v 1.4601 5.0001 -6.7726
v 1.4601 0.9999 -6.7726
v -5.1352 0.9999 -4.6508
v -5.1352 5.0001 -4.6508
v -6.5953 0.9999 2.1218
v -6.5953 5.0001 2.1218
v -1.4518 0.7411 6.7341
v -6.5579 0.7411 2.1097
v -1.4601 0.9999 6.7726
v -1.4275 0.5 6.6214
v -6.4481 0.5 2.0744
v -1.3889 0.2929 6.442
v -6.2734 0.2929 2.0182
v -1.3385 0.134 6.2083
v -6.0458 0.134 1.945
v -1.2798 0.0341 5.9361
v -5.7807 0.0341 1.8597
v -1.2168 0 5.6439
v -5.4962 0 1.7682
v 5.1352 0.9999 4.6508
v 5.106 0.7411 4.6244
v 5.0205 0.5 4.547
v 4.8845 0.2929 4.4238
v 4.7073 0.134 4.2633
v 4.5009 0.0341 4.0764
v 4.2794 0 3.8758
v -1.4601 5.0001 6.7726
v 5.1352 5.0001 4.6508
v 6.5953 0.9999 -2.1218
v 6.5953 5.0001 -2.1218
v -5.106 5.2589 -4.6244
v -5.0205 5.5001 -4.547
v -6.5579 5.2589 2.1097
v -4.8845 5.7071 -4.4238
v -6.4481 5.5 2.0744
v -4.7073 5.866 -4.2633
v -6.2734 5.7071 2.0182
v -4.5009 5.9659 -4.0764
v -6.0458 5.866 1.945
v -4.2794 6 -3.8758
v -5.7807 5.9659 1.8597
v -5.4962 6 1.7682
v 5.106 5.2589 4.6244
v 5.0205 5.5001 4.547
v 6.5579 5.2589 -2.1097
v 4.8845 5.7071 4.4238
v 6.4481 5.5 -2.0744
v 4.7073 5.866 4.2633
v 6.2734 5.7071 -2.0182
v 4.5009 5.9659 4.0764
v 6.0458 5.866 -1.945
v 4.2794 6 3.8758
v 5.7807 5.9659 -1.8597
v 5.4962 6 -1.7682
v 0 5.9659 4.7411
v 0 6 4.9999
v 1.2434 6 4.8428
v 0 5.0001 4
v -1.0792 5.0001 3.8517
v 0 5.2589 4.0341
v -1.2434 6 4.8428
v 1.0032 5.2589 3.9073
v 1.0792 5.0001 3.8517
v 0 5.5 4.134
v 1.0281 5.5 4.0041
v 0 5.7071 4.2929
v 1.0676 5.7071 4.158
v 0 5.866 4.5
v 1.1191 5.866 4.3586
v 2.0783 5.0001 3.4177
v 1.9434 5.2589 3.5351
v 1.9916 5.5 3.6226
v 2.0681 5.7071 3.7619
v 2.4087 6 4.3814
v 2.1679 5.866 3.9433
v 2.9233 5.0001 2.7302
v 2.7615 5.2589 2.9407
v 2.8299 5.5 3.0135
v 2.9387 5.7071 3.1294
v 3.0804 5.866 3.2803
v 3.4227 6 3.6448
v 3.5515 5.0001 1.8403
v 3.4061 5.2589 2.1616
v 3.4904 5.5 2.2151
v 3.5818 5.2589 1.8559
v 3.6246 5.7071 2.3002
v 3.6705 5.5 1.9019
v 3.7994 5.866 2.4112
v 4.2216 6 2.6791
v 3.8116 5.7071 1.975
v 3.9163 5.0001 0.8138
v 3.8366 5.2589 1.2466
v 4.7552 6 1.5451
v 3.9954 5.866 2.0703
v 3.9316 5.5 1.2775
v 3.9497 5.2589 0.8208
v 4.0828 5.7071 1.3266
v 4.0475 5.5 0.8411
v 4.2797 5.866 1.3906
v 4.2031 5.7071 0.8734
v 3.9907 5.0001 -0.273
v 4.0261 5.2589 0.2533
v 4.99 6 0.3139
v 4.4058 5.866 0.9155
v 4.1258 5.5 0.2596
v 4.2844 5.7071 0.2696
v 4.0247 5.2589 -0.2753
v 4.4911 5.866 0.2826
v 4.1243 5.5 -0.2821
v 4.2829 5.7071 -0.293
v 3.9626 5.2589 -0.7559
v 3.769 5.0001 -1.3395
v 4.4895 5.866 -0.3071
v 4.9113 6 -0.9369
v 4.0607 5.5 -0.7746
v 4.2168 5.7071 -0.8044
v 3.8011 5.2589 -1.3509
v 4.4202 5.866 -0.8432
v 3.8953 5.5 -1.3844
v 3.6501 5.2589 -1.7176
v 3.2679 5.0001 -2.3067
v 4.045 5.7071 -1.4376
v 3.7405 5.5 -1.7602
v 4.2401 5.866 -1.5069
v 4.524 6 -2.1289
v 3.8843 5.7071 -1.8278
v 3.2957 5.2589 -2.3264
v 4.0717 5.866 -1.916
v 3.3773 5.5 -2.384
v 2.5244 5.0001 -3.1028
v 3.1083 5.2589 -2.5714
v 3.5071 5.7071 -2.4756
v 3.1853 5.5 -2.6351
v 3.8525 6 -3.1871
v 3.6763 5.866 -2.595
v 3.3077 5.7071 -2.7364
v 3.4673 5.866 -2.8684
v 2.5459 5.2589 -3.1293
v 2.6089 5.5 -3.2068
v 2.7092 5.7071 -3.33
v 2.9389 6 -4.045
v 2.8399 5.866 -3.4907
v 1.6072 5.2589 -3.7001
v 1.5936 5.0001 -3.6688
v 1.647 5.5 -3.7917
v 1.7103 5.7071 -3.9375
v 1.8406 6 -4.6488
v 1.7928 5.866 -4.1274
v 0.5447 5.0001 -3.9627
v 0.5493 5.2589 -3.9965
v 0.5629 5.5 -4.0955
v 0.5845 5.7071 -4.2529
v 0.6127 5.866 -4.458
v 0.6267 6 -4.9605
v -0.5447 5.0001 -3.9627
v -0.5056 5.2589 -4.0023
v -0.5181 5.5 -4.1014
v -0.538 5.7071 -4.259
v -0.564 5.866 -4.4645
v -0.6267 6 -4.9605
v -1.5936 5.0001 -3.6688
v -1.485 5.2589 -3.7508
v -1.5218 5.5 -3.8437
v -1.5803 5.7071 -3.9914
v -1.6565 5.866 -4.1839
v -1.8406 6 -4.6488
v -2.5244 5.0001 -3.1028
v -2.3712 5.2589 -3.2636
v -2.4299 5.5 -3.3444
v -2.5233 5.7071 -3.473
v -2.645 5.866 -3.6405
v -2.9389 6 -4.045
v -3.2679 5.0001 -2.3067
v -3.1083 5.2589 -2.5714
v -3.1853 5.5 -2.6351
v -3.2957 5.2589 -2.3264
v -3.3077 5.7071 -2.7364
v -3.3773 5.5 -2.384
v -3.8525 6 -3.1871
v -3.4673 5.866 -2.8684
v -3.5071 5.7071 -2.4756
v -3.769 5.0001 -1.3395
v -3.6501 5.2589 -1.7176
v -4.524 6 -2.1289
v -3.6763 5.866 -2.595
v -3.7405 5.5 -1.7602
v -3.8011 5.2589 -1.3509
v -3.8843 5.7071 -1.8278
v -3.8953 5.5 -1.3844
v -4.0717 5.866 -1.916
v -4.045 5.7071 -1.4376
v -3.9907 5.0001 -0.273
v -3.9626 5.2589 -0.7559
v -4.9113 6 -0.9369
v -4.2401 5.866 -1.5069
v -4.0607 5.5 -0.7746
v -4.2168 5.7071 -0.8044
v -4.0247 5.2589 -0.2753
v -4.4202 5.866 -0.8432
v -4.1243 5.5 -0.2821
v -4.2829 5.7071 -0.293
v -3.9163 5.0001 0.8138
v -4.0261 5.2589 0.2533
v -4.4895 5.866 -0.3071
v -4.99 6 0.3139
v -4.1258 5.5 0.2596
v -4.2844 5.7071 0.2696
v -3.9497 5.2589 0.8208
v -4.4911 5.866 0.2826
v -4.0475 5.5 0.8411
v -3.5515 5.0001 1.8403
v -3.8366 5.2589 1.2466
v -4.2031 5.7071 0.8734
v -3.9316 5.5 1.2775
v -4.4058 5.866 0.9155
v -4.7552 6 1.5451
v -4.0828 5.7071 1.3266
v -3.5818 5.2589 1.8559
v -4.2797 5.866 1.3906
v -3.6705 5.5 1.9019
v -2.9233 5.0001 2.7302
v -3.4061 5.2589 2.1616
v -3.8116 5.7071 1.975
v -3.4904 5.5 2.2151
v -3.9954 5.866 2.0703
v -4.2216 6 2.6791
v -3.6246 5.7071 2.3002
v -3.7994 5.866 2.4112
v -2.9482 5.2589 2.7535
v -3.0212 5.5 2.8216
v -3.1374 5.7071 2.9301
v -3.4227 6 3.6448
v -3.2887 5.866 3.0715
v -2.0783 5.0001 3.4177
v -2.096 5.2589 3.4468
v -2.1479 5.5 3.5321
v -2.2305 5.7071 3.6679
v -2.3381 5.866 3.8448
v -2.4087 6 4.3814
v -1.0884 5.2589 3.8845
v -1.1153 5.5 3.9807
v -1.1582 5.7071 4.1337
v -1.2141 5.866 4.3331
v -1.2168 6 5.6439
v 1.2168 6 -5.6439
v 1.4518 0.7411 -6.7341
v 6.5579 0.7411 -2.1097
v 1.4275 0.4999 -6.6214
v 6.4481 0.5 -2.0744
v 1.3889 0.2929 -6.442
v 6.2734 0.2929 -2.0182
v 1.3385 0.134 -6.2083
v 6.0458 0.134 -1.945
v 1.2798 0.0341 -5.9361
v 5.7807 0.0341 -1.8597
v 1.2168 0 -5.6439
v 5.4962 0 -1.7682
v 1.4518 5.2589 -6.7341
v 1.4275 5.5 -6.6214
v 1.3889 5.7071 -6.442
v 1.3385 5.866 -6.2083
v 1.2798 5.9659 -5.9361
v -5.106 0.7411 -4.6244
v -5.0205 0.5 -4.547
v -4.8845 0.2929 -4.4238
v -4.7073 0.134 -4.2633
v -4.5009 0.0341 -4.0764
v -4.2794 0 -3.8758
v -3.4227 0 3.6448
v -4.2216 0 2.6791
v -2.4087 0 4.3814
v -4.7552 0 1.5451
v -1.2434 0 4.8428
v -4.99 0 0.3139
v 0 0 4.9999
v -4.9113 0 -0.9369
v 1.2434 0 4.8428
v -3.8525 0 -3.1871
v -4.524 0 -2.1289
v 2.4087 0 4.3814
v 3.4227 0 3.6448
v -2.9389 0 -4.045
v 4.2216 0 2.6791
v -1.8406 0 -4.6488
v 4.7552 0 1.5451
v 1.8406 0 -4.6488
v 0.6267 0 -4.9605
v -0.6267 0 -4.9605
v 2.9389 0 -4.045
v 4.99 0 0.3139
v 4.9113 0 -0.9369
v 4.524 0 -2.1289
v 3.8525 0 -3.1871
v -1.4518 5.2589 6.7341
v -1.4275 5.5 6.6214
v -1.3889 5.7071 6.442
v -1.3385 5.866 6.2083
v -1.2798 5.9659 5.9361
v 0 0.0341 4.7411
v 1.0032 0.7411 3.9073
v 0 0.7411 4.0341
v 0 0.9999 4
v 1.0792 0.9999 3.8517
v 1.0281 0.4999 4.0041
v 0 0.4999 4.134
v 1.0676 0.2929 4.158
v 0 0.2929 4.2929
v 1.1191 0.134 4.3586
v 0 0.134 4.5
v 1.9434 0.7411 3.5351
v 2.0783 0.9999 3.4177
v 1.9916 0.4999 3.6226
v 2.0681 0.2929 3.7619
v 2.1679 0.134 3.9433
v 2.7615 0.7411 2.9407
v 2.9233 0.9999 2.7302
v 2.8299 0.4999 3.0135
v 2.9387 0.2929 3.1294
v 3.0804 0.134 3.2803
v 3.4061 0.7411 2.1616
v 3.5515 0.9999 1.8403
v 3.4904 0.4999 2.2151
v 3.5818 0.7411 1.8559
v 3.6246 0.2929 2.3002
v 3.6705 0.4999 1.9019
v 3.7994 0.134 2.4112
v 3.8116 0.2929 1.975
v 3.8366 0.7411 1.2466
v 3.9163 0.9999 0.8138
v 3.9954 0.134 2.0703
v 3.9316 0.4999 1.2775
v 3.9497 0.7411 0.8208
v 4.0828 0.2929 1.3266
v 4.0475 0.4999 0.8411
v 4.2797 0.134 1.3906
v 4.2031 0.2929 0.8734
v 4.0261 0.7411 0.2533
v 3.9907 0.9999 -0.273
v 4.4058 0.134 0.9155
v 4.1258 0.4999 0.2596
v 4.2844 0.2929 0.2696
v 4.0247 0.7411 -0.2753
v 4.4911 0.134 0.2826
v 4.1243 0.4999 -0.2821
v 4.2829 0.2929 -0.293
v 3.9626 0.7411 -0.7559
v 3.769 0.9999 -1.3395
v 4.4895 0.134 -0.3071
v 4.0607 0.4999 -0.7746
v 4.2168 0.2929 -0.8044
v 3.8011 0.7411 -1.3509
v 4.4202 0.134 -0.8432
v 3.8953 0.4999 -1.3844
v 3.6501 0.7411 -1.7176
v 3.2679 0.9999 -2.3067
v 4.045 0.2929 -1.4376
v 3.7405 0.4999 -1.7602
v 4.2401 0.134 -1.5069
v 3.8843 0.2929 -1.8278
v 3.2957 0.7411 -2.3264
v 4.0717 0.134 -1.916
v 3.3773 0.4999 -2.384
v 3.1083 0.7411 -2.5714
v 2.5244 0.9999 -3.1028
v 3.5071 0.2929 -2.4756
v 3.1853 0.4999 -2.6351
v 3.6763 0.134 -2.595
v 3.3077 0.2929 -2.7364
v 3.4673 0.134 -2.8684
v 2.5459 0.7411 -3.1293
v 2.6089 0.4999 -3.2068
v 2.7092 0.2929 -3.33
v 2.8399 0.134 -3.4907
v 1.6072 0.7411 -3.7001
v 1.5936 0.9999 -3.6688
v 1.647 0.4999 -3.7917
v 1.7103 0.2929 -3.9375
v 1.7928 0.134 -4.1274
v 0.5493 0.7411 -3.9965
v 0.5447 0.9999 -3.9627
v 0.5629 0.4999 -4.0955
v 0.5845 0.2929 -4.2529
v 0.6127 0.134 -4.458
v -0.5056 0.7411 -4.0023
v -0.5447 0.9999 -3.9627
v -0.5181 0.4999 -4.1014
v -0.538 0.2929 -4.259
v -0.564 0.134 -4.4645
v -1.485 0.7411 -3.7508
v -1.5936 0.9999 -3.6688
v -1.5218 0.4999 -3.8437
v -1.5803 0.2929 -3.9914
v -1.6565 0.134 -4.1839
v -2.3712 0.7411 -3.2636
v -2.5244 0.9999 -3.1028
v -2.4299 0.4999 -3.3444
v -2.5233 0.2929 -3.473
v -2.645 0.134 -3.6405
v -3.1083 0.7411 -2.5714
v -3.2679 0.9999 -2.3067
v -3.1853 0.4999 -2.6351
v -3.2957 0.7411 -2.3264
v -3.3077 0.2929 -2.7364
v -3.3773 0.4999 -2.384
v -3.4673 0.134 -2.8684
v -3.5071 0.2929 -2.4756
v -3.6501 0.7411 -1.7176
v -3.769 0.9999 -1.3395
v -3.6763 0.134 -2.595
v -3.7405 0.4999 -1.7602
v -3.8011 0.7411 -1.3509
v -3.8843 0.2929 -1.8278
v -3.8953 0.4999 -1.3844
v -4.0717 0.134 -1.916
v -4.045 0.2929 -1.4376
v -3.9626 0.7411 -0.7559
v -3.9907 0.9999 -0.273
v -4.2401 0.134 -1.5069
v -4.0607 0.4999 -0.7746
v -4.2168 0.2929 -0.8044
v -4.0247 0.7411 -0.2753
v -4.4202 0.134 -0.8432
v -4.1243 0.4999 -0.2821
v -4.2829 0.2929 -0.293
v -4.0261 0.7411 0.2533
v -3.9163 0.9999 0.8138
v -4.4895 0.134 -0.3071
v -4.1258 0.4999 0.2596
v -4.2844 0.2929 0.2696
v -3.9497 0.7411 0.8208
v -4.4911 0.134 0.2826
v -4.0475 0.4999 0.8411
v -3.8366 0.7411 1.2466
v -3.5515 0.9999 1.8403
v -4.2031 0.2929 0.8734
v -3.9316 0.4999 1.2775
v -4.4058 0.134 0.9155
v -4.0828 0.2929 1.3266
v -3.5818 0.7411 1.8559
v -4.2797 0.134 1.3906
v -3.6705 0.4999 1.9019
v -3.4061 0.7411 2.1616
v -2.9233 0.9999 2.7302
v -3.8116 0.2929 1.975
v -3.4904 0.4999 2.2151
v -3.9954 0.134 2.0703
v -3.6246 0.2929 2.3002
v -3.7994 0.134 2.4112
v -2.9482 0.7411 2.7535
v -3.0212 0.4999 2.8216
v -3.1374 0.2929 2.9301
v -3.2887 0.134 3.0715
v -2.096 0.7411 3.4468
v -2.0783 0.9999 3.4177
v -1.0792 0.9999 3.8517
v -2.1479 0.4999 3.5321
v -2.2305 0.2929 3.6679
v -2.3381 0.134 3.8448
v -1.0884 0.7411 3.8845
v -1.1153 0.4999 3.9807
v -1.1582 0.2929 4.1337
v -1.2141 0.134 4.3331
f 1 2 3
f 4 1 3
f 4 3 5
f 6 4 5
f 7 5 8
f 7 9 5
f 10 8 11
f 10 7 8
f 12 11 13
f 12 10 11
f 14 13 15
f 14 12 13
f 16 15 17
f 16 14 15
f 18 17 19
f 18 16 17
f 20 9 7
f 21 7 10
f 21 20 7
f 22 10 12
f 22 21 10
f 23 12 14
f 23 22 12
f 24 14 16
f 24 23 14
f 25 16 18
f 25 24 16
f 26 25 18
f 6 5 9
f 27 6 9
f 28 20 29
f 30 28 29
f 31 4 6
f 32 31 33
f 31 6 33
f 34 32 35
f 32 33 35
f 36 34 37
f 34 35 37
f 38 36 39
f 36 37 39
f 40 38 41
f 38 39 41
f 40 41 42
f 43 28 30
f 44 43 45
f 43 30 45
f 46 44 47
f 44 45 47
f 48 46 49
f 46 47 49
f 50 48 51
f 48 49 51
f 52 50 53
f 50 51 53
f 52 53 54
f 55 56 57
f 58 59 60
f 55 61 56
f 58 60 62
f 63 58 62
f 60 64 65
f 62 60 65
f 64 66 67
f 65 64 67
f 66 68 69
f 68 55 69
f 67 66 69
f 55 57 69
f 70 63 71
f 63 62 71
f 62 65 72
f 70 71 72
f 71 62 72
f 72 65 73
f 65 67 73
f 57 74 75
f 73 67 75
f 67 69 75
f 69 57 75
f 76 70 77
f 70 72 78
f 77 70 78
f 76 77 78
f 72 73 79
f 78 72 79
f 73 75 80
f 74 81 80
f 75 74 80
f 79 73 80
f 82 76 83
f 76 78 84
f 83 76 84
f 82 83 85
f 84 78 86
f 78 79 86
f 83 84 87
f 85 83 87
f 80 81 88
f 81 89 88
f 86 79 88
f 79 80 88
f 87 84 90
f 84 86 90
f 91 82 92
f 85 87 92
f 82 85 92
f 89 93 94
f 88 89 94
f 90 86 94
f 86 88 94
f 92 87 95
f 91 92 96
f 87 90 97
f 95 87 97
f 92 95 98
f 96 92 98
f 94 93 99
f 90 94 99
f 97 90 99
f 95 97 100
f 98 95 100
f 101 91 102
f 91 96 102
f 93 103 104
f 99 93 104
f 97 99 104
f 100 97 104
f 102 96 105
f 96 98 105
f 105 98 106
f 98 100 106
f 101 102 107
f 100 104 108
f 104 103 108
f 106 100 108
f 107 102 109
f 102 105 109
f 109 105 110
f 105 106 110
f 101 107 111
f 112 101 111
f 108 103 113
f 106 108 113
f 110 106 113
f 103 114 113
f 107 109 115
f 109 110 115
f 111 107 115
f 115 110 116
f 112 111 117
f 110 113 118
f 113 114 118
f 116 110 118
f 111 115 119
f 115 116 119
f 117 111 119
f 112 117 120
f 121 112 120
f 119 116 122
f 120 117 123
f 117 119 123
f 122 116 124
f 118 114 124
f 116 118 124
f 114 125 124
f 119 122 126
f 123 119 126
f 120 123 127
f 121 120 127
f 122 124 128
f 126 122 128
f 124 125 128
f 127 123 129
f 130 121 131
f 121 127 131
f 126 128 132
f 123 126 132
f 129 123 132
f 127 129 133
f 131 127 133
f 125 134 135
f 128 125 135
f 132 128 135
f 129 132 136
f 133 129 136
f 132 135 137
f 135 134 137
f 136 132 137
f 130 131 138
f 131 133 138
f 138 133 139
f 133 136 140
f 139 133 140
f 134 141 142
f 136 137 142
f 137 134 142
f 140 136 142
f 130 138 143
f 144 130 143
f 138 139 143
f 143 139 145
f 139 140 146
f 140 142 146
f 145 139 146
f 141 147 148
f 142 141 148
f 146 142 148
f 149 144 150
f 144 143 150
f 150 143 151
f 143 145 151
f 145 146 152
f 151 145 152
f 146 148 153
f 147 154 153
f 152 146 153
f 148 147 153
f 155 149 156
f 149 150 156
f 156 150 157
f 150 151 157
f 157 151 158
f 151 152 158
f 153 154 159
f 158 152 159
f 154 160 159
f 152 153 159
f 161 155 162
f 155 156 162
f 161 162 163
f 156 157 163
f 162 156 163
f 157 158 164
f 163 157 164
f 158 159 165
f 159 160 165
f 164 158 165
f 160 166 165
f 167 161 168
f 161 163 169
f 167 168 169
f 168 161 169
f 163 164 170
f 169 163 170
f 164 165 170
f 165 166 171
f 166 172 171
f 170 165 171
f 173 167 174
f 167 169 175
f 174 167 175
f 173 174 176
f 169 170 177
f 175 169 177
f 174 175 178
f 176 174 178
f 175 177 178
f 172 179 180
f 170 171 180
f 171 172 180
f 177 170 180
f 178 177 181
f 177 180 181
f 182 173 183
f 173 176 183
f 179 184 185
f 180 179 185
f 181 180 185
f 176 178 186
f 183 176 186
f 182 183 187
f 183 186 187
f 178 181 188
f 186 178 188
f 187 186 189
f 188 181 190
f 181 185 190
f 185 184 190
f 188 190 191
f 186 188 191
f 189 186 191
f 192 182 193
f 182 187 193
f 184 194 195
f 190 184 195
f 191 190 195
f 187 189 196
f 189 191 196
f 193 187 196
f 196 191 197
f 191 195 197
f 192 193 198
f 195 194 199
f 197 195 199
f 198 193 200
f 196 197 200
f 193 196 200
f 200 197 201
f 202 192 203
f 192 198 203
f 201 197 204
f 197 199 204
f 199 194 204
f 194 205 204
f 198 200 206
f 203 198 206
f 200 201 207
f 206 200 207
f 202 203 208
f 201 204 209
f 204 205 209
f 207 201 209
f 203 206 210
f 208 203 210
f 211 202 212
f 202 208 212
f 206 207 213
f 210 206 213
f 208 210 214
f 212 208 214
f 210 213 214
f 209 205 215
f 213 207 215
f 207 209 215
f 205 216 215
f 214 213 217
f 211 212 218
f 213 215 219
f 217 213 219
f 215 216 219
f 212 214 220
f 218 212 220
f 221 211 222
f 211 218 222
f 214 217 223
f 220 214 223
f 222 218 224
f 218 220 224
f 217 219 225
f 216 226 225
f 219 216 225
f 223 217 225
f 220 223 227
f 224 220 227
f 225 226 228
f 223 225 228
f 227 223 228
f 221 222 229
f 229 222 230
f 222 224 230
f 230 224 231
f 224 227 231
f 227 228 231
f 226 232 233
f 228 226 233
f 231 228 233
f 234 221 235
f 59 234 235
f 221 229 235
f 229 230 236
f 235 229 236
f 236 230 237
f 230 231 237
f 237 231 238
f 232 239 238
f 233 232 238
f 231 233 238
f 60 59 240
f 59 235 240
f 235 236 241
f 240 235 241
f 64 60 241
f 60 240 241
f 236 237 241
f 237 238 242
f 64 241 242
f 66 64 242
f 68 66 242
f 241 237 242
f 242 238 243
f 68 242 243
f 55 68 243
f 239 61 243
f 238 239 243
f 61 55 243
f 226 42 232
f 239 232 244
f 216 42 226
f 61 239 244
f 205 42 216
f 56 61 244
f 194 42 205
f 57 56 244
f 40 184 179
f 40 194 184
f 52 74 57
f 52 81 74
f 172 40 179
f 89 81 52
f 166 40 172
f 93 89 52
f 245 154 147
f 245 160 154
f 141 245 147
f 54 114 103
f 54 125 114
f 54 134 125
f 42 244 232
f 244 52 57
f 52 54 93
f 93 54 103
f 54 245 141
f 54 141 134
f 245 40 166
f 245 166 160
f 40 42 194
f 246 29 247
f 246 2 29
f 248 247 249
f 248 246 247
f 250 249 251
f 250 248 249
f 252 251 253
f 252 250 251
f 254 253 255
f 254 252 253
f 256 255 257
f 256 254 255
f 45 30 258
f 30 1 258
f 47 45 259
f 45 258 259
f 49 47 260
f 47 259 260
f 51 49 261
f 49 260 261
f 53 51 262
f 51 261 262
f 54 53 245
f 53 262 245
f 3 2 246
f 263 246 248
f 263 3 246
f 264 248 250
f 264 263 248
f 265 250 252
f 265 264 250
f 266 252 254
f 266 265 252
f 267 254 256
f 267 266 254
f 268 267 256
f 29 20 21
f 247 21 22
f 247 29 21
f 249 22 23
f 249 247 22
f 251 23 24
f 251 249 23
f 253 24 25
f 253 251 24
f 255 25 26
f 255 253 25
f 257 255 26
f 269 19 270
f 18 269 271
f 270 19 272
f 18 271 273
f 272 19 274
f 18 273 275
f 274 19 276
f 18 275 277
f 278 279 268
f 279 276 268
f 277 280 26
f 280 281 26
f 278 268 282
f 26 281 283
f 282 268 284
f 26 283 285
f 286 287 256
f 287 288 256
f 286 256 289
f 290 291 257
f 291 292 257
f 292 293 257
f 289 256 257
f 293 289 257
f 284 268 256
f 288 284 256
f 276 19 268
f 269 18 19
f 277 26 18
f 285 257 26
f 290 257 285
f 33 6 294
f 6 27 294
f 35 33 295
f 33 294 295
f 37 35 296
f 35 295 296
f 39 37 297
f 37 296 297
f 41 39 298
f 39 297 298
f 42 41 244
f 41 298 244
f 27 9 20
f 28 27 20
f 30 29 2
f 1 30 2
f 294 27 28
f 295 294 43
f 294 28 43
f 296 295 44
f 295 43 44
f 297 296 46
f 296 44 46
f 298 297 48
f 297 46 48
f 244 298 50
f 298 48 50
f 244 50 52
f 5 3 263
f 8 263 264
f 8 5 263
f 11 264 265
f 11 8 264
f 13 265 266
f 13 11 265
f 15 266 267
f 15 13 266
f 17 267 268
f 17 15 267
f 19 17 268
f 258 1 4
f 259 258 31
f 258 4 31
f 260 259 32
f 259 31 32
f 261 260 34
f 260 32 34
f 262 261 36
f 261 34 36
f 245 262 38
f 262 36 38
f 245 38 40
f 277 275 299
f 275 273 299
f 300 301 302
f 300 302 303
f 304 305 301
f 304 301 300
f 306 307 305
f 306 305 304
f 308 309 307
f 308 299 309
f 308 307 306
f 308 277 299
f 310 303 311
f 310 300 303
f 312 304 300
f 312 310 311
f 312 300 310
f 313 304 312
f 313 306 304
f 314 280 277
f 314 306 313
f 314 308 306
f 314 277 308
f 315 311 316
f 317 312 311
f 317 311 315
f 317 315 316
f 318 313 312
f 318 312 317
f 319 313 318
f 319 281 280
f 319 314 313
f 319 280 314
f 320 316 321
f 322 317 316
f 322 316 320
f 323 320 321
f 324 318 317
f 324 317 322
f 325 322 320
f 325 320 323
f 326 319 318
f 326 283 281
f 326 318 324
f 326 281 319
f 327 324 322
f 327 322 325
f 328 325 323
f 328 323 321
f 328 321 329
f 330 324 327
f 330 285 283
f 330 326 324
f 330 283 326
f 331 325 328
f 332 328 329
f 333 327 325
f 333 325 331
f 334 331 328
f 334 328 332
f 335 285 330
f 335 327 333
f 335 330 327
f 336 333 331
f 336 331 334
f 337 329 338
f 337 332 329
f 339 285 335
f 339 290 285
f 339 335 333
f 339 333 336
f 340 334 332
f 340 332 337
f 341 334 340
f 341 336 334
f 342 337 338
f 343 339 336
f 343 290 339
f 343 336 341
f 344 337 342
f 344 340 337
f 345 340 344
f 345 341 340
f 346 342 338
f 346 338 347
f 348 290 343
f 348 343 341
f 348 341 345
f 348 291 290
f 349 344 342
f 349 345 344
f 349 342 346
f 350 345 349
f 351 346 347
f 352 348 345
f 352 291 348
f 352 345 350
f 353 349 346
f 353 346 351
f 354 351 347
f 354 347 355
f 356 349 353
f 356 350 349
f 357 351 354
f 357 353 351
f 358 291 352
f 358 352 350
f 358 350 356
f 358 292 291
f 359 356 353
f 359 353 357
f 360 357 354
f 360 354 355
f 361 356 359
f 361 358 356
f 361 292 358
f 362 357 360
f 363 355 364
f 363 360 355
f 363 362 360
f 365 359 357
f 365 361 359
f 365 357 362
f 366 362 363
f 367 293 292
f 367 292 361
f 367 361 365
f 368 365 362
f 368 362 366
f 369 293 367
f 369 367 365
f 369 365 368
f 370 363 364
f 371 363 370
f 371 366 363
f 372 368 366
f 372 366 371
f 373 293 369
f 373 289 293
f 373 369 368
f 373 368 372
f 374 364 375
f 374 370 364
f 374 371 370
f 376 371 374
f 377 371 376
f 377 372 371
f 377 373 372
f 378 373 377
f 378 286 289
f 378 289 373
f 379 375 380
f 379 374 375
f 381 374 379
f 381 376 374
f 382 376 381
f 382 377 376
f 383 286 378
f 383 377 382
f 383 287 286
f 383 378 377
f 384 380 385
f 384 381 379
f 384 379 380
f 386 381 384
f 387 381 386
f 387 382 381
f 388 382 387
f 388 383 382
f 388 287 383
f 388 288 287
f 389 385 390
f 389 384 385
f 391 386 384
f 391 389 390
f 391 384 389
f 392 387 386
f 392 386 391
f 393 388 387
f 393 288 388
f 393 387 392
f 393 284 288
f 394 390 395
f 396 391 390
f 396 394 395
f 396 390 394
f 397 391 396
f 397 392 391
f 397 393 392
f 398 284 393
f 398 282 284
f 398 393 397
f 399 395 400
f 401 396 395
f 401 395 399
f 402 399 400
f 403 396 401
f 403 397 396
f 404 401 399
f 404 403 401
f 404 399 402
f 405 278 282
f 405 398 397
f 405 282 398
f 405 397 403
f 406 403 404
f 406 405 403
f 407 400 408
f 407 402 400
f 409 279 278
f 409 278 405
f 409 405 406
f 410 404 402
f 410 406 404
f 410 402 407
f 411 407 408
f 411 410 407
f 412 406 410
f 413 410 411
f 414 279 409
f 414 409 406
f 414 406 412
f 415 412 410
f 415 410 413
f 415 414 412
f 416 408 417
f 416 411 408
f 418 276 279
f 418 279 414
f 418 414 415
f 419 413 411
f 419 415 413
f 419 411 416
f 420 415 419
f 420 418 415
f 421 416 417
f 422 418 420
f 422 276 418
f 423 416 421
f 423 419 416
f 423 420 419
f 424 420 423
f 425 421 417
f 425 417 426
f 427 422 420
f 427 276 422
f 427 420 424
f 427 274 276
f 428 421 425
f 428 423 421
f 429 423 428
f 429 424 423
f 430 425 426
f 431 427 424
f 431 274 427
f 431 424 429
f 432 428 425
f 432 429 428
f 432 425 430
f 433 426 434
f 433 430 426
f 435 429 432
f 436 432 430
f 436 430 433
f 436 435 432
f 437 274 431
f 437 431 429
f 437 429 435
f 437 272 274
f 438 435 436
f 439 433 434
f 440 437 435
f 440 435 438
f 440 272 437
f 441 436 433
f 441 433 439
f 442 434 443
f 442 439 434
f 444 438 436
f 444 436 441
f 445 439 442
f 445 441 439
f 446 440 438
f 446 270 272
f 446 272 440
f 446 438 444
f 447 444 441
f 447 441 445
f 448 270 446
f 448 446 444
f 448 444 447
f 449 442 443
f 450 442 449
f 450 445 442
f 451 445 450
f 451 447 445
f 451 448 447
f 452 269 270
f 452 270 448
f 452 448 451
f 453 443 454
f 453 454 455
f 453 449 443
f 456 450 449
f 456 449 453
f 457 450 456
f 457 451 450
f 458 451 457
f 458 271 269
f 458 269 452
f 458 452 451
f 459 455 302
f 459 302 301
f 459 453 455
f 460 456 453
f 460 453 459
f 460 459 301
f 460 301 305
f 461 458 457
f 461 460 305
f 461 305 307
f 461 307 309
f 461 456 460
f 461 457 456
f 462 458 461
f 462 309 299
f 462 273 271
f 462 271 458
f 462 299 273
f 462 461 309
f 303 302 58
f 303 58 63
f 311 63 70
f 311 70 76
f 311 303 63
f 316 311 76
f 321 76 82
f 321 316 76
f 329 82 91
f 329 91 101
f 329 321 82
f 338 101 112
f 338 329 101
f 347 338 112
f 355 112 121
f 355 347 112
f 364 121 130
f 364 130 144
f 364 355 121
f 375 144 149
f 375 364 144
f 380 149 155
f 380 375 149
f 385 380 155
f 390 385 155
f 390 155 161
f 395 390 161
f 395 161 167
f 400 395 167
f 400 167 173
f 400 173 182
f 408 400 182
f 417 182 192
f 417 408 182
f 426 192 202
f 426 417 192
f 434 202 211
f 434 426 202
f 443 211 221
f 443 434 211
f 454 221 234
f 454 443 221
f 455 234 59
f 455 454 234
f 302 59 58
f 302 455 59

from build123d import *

# Parameters (mm, degrees)
SKETCH1_R           = 4
BOSS_EXTRUDE1_DEPTH = 6
FILLET1_R           = 1


with BuildPart() as part:
    # Sketch1 → Boss-Extrude1 (new body)
    with BuildSketch(Plane(origin=(0, 0, 0), x_dir=(1, 0, 0), z_dir=(0, 1, 0))):
        Polygon((-5.135167492, 4.650812276), (-6.595305325, -2.121779363), (-1.460137834, -6.772591639), (5.135167492, -4.650812276), (6.595305325, 2.121779363), (1.460137834, 6.772591639), align=None)
        with Locations(Location((0, 0, 0), (0, 0, 270))):
            Circle(SKETCH1_R, mode=Mode.SUBTRACT)
    extrude(amount=BOSS_EXTRUDE1_DEPTH)

    # Fillet1
    fillet1_edges = [part.edges().sort_by_distance(p)[0] for p in [
        (-4.02772158, 6, 4.447185501),
        (1.837514829, 6, 5.711701958),
        (5.865236409, 6, 1.264516457),
        (0, 0, -4),
        (0, 6, -4),
        (4.02772158, 6, -4.447185501),
        (-1.837514829, 6, -5.711701958),
        (4.02772158, 0, -4.447185501),
        (5.865236409, 0, 1.264516457),
        (1.837514829, 0, 5.711701958),
        (-5.865236409, 6, -1.264516457),
        (-4.02772158, 0, 4.447185501),
        (-5.865236409, 0, -1.264516457),
        (-1.837514829, 0, -5.711701958),
    ]]
    fillet(fillet1_edges, radius=FILLET1_R - 0.0001)  # a hair under: the kernel refuses the full size


solid = part.part
